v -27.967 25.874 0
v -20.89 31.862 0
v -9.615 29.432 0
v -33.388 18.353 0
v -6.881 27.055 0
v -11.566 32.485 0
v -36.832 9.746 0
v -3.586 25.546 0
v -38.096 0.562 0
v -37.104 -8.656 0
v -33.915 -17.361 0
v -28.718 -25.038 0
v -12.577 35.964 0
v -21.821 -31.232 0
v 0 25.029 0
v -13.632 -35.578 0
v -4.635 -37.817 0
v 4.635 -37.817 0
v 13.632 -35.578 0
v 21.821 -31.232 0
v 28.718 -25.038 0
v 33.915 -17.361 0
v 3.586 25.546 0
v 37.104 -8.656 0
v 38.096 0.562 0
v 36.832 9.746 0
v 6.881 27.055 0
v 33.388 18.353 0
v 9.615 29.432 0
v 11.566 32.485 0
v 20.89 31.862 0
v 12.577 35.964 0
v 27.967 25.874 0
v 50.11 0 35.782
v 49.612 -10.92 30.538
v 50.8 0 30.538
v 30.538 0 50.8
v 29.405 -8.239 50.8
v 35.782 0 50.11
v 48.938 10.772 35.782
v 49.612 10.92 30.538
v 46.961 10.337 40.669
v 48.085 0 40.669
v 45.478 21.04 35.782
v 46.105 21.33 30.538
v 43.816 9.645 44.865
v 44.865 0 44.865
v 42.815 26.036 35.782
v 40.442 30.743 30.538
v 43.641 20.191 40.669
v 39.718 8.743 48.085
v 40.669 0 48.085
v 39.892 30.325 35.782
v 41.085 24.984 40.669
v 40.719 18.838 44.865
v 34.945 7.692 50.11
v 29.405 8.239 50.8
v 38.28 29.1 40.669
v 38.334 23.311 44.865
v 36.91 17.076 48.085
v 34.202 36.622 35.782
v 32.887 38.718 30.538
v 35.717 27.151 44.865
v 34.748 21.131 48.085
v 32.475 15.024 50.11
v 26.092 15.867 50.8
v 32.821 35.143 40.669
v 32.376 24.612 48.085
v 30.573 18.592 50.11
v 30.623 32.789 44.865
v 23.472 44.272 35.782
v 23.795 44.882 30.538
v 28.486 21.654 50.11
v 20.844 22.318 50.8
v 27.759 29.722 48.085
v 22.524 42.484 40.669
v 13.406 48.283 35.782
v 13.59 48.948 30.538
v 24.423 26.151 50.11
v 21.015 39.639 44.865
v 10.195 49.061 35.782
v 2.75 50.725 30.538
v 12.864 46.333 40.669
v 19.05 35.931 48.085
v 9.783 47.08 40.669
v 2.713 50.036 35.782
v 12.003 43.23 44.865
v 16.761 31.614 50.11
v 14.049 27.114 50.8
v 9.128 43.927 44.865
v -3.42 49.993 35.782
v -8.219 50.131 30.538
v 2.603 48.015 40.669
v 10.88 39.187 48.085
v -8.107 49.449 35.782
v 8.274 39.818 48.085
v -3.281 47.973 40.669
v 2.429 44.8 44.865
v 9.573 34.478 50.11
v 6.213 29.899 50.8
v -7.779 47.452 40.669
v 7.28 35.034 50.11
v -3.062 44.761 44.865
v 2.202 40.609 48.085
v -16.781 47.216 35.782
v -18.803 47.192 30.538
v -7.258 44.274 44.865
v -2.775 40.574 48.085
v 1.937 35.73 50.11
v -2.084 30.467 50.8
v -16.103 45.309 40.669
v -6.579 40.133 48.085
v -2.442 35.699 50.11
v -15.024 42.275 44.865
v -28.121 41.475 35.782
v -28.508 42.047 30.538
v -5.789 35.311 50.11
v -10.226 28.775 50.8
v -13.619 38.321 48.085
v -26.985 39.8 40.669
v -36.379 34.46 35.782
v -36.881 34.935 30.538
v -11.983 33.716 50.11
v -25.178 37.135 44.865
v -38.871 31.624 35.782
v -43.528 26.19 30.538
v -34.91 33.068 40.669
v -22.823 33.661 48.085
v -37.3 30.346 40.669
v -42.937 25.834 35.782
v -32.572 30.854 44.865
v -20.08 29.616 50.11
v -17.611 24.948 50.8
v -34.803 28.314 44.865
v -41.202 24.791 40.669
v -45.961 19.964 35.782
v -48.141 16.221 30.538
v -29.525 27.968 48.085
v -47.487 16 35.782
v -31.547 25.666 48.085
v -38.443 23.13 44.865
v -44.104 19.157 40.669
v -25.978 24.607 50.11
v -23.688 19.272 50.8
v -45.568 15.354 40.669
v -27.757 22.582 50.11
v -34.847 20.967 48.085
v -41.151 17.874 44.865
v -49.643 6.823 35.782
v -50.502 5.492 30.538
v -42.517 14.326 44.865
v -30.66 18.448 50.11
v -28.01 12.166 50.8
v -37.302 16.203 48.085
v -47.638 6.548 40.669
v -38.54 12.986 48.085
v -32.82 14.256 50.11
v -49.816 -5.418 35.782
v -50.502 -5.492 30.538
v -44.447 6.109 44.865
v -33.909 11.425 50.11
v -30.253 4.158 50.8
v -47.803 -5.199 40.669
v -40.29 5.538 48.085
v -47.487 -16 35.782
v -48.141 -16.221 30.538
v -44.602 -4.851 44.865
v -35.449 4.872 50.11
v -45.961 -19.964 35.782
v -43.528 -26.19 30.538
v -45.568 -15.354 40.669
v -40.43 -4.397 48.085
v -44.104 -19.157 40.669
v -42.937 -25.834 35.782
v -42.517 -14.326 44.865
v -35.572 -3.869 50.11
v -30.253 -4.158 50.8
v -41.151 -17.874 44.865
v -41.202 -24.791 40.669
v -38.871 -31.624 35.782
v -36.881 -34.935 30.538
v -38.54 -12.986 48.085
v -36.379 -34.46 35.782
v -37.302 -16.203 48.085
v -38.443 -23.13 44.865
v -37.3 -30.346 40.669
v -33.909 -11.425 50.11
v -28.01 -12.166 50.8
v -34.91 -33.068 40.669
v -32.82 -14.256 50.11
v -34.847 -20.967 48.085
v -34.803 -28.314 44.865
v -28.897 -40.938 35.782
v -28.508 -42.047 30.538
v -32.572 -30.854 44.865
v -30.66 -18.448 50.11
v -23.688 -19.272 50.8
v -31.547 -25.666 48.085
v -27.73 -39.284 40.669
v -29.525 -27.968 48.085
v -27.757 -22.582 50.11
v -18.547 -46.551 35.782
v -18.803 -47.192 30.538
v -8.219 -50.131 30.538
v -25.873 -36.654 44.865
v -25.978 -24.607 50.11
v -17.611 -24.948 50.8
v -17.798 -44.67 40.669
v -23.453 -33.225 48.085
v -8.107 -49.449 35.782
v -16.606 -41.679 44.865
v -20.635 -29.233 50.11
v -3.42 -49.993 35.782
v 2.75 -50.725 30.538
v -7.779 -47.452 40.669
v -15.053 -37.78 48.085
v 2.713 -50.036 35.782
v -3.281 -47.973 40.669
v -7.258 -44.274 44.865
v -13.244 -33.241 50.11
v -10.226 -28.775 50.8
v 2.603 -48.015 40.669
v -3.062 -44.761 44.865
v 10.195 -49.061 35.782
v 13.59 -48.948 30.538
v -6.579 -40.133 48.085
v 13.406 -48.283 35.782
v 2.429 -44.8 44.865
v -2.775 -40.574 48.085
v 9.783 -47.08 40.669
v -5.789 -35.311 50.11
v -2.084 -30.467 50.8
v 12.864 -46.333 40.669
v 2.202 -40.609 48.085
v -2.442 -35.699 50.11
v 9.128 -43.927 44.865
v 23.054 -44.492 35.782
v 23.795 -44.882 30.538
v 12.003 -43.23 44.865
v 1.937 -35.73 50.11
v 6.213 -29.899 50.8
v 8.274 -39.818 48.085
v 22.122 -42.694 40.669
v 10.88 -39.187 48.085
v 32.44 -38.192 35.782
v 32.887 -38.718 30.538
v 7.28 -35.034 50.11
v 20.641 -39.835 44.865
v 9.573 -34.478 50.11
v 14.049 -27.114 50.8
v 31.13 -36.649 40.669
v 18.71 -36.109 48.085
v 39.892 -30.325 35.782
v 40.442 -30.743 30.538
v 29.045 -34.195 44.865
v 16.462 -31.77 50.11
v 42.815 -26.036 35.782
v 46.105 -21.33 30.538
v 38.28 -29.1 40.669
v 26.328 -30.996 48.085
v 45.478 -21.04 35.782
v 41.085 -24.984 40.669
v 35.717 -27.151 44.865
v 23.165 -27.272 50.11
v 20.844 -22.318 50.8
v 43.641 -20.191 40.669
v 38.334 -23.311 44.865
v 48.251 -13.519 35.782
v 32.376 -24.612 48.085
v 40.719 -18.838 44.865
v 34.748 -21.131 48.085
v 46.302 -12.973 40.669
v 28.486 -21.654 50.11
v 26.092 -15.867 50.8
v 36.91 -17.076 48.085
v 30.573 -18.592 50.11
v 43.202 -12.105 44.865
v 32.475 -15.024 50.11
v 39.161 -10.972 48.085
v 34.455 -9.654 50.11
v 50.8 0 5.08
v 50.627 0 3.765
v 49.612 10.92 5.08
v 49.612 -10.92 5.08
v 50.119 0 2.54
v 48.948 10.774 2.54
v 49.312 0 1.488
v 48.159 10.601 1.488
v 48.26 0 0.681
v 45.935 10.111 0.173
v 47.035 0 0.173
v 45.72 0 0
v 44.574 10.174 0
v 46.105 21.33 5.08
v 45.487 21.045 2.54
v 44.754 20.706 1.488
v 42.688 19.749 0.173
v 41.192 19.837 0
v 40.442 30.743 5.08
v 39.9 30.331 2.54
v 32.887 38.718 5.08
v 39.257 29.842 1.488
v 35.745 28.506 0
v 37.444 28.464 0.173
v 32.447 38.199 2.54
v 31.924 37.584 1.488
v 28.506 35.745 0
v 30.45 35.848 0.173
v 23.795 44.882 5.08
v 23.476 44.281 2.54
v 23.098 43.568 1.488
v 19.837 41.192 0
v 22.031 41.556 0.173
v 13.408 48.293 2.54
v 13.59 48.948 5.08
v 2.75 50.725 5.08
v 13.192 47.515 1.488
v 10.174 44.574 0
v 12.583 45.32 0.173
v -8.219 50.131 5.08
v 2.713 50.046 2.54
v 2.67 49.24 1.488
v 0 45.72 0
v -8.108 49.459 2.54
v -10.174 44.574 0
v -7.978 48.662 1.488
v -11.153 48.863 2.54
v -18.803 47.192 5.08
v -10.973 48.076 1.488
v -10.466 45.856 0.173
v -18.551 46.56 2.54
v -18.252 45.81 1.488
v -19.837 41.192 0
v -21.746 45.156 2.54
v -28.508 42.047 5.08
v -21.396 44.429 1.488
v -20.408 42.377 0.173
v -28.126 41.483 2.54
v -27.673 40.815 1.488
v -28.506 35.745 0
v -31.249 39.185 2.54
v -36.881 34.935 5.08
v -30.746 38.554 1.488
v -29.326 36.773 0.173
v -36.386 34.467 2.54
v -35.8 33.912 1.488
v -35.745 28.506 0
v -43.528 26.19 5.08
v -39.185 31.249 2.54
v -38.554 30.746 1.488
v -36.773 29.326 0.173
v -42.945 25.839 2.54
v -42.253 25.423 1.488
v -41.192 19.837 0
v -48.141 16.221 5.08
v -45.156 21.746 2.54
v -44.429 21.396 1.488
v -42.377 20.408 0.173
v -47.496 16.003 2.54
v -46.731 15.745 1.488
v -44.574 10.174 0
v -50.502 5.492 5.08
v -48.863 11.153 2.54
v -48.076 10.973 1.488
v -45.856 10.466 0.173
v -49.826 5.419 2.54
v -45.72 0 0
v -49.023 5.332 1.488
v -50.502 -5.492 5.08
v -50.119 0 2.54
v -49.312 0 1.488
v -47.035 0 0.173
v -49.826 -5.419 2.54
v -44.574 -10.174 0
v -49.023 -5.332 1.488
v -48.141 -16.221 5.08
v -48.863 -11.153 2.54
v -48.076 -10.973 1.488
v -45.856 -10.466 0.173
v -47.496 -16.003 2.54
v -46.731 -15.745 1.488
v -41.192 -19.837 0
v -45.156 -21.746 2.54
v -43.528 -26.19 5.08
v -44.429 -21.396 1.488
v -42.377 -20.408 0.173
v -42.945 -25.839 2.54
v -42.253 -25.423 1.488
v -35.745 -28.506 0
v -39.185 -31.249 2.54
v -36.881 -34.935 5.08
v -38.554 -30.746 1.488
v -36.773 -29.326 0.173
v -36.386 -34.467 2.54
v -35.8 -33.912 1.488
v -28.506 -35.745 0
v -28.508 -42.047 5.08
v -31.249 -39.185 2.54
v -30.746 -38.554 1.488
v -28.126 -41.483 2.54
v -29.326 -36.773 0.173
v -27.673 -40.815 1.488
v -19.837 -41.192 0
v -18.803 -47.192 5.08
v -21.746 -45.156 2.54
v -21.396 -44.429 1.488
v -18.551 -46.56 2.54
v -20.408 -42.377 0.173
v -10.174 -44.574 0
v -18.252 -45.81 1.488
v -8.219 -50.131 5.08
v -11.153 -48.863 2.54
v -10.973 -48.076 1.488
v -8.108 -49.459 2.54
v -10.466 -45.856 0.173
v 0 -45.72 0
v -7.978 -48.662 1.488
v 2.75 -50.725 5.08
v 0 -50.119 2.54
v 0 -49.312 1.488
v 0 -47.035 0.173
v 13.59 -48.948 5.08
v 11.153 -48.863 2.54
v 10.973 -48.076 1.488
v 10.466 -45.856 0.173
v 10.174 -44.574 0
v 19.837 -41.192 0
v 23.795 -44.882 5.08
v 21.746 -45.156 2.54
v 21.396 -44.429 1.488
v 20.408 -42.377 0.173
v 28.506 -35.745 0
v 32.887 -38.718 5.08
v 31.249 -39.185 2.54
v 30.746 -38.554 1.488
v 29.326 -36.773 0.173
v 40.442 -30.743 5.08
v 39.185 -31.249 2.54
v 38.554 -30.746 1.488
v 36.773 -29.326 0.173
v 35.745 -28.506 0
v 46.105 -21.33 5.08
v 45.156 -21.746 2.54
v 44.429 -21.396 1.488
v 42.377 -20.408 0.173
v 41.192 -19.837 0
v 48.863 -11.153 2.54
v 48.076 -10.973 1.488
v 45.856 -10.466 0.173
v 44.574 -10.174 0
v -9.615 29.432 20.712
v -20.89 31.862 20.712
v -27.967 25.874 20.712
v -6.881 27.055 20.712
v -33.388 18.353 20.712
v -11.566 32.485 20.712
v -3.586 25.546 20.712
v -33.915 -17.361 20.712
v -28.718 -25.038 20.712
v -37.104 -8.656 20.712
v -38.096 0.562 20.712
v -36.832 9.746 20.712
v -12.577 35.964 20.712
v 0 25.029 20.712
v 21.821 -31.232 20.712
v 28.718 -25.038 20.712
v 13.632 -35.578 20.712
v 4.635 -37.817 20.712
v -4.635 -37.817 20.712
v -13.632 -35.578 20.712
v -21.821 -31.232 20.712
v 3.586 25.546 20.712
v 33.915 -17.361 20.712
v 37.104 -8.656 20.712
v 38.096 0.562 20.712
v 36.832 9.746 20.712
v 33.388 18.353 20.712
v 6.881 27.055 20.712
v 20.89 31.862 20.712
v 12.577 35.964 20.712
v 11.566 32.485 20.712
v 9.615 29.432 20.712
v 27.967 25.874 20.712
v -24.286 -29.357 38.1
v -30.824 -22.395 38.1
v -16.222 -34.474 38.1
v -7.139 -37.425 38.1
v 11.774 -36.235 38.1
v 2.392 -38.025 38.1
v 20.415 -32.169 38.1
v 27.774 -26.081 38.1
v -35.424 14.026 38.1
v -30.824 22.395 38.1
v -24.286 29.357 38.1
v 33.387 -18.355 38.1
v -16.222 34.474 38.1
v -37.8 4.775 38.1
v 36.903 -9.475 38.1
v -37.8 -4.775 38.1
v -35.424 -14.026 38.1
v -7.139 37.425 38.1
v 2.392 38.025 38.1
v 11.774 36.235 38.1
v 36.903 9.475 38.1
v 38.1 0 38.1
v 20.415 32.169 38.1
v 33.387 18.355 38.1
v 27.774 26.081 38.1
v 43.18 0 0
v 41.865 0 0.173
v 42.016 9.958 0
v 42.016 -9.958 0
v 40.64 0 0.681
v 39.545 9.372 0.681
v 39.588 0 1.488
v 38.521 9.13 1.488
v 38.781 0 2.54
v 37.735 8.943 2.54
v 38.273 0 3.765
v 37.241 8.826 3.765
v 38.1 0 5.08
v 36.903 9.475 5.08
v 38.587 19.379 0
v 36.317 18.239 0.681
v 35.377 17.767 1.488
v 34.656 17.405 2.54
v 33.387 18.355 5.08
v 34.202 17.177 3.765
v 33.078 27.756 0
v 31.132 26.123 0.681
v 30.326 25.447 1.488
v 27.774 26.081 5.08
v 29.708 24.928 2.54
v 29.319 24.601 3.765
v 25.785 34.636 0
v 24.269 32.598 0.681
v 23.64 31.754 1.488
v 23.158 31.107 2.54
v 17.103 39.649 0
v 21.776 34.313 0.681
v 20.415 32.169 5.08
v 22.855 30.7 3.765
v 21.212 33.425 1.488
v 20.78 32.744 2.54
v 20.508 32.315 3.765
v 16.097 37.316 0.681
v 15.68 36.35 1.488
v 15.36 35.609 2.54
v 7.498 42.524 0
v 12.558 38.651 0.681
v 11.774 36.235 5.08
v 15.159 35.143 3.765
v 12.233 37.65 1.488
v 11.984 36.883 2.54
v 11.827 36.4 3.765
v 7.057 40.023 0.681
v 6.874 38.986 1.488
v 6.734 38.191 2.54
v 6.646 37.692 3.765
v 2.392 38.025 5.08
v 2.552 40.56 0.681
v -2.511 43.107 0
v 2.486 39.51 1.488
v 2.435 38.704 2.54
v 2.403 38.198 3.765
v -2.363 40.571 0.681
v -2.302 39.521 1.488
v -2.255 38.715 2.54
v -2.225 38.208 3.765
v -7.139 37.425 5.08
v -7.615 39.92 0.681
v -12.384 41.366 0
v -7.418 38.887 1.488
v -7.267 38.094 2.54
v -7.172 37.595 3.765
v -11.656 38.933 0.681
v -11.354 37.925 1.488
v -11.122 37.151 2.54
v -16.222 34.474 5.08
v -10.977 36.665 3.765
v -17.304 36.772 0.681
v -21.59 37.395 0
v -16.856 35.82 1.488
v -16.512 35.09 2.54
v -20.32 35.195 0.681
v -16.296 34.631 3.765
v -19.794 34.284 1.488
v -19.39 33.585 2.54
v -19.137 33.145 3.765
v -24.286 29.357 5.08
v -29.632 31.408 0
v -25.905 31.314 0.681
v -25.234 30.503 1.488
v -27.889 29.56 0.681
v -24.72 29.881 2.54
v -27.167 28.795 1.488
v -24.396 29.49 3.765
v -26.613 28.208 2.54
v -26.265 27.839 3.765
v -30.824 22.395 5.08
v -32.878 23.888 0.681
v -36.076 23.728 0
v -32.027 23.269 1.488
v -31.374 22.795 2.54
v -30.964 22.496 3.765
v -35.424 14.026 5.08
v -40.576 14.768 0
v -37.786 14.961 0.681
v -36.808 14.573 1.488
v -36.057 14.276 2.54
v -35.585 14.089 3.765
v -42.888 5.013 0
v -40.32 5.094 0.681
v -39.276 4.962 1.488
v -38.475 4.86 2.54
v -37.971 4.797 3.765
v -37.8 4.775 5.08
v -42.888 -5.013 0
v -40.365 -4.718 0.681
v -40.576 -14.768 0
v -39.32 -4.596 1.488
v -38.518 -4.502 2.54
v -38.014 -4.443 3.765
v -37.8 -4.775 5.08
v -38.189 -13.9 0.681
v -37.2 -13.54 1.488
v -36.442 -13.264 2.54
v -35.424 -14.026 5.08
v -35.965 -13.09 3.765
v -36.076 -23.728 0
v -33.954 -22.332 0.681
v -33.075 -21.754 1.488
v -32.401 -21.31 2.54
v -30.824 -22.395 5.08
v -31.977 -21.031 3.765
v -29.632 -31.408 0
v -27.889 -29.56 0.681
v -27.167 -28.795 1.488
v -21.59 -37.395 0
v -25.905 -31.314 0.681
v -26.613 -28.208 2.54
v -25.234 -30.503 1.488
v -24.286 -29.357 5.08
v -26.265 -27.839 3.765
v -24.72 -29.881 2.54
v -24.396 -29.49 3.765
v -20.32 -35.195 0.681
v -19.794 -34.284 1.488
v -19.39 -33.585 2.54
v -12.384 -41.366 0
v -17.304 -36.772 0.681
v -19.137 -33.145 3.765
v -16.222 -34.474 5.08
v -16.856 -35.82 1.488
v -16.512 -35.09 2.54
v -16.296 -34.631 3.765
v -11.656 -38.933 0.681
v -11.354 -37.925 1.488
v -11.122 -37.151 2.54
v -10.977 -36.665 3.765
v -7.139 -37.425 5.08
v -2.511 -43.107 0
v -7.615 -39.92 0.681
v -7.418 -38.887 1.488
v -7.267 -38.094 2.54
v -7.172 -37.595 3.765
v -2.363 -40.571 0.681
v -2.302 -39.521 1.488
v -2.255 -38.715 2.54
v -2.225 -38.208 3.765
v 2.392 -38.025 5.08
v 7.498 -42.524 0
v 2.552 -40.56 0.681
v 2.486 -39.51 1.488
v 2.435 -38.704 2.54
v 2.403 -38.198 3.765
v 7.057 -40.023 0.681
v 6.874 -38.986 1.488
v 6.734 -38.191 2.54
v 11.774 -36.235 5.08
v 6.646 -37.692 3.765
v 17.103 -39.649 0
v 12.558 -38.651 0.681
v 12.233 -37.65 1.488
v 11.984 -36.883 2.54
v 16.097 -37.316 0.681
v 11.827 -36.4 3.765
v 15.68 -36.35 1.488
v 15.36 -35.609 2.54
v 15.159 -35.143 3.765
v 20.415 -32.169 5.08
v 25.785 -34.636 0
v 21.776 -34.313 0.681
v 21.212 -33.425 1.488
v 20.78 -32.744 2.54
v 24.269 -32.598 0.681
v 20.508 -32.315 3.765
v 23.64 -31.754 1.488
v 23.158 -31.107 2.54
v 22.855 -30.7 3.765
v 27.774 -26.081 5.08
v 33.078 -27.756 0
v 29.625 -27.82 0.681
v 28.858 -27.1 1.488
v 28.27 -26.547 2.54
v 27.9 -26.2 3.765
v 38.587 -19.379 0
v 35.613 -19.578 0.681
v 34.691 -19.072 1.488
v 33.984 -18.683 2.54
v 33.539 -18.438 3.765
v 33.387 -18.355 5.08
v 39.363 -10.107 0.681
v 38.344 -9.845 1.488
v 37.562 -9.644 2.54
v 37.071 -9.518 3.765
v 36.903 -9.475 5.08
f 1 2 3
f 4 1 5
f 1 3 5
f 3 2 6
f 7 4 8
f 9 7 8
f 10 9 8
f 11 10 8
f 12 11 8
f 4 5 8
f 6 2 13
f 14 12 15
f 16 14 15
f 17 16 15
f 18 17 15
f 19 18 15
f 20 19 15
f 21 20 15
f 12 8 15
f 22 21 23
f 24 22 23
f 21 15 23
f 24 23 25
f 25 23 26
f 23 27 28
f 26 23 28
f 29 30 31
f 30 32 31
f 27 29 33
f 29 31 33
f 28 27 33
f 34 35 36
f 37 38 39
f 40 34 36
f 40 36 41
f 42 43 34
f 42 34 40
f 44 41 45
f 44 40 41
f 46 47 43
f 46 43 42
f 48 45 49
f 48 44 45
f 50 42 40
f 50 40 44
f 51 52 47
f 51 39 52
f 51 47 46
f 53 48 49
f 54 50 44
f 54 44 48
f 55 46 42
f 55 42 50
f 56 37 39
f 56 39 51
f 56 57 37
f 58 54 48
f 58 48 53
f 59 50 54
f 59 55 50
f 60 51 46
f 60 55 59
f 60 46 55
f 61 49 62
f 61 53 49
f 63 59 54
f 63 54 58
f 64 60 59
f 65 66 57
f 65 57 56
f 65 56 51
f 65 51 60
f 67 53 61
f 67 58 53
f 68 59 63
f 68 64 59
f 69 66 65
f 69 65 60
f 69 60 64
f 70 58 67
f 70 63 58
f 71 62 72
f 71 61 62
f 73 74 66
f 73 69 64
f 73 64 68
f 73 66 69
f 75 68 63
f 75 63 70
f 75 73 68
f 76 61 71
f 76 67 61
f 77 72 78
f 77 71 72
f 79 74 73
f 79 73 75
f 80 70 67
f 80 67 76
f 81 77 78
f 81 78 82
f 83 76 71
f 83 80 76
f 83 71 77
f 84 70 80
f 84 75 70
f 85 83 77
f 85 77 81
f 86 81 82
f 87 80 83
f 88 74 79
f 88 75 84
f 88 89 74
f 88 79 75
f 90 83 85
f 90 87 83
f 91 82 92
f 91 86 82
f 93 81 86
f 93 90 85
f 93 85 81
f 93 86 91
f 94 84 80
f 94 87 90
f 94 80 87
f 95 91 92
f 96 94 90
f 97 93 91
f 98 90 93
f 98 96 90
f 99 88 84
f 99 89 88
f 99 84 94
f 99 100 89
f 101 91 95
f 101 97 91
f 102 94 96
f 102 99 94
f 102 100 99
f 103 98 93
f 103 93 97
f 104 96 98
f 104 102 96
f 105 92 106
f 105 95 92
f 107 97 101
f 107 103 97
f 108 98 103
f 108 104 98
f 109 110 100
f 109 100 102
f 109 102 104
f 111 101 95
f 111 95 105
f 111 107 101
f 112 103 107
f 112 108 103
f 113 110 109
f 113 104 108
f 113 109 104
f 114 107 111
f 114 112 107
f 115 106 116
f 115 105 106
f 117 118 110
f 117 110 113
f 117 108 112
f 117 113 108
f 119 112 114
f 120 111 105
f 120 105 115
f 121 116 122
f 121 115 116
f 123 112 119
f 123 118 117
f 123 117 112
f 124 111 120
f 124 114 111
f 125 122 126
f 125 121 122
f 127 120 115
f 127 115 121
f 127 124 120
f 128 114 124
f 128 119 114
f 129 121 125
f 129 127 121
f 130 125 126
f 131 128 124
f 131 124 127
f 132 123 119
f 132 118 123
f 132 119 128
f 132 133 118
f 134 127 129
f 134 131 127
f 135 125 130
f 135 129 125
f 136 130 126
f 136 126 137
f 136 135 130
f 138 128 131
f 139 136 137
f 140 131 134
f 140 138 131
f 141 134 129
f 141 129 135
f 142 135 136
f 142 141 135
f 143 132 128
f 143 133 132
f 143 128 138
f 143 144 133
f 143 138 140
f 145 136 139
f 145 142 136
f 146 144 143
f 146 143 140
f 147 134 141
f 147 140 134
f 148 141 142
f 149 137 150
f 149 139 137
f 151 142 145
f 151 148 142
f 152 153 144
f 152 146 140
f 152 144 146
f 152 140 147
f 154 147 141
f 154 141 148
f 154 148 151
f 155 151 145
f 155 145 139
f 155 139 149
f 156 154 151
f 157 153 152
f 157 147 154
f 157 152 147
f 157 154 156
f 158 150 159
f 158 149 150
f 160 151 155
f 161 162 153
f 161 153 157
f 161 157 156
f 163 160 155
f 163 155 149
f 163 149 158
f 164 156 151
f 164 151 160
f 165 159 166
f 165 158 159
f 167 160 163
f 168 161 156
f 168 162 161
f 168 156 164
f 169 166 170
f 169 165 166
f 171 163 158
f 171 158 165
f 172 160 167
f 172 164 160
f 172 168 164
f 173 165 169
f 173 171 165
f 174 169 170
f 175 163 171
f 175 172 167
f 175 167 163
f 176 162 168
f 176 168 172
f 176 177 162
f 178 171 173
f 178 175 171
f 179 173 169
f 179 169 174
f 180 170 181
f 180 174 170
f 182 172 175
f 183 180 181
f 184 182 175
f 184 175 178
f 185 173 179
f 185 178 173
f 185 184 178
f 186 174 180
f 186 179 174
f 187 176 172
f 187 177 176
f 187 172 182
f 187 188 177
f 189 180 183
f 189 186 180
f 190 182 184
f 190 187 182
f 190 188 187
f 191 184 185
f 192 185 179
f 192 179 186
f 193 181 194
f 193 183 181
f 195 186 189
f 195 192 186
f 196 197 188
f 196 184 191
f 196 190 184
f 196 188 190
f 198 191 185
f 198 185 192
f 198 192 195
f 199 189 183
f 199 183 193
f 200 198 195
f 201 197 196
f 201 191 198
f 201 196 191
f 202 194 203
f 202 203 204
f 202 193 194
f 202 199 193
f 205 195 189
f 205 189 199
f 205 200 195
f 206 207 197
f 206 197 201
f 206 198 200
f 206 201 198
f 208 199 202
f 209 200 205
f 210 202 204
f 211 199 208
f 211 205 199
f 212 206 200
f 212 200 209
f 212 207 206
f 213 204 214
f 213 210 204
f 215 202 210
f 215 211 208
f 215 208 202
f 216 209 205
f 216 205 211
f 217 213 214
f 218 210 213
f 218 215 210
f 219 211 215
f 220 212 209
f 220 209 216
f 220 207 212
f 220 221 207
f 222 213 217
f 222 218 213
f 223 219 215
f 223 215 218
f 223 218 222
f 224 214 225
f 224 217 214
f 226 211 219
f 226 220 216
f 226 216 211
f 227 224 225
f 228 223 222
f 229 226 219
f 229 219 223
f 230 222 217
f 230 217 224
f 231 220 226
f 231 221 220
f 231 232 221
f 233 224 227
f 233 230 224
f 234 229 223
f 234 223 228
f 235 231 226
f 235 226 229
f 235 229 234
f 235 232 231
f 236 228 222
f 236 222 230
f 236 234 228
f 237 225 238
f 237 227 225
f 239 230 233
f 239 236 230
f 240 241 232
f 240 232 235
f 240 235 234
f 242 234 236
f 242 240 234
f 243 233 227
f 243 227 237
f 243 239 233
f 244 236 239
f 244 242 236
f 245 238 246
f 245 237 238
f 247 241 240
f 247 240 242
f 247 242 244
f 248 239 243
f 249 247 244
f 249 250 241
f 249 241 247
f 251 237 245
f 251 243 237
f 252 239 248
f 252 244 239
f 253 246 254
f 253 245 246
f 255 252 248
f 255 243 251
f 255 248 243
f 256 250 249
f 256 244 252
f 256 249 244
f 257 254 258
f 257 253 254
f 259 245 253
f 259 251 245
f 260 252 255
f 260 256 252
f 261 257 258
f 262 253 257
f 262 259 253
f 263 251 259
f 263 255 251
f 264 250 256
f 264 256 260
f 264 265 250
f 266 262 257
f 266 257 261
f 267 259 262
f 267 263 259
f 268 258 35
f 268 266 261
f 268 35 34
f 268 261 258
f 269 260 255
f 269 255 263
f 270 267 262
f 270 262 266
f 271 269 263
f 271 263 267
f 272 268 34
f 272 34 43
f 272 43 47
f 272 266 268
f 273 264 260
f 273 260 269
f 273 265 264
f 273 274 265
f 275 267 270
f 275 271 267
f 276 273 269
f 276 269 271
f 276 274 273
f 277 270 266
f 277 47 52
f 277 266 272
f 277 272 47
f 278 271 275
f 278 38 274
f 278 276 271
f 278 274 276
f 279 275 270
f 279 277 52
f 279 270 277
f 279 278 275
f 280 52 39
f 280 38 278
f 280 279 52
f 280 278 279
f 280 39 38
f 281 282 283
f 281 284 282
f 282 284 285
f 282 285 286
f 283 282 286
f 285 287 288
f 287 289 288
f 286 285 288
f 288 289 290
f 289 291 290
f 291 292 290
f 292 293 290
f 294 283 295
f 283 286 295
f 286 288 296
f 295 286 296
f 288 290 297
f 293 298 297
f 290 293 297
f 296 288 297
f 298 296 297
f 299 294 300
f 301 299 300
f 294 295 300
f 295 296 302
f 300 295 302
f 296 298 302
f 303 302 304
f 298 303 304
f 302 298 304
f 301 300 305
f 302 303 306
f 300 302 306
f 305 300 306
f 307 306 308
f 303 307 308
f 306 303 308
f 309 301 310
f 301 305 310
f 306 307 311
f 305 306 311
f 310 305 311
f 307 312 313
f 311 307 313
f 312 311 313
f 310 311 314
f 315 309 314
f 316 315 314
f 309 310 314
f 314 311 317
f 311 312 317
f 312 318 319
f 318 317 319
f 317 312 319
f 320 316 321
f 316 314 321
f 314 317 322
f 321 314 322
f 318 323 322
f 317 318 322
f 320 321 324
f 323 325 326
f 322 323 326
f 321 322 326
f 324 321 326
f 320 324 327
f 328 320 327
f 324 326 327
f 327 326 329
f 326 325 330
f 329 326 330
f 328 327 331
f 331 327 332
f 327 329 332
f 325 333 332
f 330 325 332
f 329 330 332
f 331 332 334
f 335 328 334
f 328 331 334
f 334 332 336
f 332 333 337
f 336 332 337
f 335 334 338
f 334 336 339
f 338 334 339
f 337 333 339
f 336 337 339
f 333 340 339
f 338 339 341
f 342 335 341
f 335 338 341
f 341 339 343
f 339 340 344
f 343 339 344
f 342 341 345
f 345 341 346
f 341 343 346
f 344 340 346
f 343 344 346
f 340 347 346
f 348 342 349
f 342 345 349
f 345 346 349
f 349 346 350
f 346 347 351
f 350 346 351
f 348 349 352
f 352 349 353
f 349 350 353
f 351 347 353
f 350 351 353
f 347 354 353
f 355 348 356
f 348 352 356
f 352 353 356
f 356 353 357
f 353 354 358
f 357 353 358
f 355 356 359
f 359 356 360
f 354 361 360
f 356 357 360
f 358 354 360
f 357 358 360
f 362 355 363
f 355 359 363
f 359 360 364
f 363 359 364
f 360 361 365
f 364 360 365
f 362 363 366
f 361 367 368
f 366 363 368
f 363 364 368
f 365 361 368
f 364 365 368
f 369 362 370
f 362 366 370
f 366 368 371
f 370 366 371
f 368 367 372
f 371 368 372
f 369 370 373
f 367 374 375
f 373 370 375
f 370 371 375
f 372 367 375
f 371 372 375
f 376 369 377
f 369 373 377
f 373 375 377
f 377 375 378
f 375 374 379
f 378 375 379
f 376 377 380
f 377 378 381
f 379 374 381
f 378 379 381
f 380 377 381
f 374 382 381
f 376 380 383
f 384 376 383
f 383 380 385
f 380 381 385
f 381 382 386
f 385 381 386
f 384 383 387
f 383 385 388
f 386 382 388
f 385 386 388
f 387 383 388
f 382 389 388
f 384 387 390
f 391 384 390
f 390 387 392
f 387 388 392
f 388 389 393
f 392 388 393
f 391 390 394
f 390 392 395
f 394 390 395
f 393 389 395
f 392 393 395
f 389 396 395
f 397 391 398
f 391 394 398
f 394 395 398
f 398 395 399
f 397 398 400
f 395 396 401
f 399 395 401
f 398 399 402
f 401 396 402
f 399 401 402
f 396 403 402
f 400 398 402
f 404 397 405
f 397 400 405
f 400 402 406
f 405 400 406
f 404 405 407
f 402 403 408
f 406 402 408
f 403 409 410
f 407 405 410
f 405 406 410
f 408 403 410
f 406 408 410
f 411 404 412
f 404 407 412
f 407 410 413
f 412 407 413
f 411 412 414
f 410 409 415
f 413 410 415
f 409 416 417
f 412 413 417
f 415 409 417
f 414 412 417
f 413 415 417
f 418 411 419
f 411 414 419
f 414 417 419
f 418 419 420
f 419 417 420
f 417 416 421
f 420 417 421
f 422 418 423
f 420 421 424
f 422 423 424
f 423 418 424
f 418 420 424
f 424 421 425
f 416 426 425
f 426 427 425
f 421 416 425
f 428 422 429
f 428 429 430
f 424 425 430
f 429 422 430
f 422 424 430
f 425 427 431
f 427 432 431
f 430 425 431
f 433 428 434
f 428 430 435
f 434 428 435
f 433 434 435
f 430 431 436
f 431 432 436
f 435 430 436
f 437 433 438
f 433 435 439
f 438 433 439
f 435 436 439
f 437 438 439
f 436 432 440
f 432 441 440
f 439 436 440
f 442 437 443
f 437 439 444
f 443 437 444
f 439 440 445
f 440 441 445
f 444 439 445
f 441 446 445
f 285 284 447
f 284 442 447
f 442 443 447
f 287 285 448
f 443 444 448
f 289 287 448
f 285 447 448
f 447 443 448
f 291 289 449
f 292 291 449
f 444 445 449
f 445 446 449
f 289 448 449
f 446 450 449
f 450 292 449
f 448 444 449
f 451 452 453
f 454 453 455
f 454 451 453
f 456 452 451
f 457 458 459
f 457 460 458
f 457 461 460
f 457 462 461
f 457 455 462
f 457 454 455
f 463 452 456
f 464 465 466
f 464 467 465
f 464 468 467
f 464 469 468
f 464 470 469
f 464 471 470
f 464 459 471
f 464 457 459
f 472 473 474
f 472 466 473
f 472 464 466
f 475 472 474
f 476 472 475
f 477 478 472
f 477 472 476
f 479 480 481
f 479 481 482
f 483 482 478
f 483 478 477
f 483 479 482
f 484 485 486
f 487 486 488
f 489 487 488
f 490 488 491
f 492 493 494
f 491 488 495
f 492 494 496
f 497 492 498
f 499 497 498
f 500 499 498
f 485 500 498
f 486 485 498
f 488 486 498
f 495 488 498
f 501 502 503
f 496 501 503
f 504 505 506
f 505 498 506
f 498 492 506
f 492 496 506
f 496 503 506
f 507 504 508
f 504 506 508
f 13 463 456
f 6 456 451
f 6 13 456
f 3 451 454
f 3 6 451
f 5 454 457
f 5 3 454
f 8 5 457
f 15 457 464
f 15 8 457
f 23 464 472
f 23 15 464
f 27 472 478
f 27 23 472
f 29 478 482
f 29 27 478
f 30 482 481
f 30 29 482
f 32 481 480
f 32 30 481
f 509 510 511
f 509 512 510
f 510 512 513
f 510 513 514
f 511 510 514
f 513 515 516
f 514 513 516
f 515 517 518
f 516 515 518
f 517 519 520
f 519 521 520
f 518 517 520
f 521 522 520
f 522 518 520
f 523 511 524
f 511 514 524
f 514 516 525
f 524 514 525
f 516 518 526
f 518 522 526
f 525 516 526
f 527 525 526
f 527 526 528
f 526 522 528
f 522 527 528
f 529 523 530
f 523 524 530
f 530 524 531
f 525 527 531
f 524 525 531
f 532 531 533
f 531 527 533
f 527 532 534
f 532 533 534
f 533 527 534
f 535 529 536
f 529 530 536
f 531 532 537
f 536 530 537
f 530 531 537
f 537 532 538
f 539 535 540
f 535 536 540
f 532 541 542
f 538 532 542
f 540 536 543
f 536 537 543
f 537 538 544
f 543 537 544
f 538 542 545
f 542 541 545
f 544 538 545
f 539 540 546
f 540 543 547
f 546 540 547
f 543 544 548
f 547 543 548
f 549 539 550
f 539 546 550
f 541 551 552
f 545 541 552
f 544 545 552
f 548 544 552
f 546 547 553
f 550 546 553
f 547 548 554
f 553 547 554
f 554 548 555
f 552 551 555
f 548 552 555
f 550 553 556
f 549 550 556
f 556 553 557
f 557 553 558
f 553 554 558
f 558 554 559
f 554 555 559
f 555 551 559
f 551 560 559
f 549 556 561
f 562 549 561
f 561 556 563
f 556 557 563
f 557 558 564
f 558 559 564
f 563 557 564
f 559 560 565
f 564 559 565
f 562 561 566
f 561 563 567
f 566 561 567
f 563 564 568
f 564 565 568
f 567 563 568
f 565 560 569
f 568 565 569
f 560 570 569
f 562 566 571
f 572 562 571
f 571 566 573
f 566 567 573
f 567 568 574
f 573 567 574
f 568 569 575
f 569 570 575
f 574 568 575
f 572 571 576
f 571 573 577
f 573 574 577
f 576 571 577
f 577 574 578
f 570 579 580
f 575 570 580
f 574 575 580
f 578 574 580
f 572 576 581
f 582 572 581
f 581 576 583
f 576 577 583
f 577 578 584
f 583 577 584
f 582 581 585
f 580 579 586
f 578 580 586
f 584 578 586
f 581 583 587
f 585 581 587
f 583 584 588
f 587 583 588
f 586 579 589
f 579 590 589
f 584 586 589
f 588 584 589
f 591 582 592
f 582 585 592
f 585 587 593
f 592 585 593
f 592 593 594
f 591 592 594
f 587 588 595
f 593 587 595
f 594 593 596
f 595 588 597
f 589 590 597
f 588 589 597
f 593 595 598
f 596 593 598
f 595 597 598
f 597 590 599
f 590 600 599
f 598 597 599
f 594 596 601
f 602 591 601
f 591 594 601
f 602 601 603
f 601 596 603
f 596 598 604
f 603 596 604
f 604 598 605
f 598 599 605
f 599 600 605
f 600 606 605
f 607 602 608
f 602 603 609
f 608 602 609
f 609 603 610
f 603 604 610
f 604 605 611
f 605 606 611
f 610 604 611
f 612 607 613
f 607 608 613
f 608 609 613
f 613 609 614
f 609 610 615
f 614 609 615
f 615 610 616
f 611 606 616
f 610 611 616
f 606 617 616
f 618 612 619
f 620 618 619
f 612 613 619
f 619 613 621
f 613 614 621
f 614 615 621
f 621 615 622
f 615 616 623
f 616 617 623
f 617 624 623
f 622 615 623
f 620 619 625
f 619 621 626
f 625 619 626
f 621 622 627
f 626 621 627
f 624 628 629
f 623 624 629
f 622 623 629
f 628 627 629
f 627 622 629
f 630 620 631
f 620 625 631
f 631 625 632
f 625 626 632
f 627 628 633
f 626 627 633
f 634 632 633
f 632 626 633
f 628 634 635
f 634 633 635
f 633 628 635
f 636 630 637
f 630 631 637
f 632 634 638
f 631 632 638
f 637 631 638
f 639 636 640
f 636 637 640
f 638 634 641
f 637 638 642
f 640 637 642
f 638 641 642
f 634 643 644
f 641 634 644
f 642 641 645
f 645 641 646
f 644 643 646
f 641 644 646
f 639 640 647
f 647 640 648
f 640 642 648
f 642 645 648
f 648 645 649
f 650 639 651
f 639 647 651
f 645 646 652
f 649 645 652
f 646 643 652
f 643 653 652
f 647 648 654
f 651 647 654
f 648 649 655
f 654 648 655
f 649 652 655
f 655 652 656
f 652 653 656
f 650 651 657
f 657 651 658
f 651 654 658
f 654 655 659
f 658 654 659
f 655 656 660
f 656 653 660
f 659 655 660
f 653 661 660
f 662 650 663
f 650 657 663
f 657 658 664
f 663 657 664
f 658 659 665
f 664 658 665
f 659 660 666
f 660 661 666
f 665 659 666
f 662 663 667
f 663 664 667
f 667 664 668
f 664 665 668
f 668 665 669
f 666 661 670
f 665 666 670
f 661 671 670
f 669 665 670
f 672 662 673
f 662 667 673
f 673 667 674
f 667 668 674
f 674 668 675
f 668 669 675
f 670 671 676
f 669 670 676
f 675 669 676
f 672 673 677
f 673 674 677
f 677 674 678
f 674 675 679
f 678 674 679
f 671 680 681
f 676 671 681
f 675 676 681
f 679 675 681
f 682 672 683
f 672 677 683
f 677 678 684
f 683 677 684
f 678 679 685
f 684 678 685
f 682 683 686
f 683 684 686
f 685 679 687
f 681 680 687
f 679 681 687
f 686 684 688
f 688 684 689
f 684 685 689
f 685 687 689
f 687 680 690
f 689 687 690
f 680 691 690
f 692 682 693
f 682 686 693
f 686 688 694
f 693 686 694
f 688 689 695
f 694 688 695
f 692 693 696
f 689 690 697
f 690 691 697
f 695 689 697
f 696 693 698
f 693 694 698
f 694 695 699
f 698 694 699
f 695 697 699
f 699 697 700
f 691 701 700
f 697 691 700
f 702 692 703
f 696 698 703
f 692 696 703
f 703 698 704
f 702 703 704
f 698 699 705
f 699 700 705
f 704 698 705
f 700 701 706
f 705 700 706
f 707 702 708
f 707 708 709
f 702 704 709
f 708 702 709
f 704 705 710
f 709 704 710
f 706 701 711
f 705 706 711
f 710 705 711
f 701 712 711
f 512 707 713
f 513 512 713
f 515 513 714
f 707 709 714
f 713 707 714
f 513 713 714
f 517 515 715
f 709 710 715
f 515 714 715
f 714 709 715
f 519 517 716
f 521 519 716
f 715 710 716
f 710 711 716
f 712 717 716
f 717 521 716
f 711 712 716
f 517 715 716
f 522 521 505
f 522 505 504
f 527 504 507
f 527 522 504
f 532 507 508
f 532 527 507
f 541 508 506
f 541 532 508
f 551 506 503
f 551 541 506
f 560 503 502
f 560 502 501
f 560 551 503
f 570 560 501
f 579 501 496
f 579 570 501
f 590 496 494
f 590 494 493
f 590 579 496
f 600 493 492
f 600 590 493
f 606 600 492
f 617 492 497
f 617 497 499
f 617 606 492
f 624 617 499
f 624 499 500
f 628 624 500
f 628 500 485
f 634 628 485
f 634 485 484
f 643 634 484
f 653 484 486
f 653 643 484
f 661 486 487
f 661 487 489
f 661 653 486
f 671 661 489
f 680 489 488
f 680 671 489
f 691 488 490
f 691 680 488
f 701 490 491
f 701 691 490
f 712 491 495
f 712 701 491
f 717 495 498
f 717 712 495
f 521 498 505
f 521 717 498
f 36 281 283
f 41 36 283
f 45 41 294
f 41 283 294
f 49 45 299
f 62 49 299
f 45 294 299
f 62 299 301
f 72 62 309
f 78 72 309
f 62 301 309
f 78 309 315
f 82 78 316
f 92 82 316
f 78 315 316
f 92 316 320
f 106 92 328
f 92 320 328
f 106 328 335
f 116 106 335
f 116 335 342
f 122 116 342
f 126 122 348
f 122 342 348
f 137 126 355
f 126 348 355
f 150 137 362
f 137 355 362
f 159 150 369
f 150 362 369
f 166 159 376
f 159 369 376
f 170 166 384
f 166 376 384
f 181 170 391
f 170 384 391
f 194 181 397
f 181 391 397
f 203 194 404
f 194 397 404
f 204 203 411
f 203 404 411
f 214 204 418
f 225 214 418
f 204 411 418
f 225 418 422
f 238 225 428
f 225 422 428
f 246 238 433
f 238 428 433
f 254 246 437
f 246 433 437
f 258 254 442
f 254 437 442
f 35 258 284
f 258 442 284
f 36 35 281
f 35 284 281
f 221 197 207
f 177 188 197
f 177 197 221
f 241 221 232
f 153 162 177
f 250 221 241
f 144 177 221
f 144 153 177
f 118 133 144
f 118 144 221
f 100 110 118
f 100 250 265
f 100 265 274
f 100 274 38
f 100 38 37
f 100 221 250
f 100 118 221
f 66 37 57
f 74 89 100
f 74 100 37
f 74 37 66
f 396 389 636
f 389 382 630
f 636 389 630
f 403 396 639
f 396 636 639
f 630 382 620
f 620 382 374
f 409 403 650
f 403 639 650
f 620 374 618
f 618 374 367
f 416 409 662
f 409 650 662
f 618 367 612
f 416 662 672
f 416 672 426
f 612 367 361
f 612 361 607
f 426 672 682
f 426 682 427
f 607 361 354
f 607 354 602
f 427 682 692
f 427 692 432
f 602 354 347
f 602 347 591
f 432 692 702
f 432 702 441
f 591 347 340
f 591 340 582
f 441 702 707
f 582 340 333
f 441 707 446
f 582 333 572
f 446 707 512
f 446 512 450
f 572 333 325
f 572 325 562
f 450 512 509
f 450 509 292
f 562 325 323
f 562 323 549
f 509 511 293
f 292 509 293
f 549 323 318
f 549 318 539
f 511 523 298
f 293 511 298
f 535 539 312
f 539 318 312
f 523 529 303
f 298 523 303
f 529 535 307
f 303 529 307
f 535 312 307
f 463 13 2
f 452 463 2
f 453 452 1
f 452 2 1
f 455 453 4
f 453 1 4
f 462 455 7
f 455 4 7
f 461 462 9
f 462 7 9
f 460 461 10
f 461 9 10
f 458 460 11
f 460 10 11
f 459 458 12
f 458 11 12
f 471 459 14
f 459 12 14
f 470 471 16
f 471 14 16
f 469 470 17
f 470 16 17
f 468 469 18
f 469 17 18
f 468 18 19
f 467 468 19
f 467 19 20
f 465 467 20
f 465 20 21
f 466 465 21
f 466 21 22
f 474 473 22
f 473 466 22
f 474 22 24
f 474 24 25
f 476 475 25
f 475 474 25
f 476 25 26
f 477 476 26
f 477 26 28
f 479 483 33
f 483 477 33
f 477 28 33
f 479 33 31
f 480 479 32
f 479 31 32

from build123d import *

# Parameters (mm, degrees)
F0_R     = 50.8
F0_R_2   = 38.1
F1_DEPTH = 50.8
F2_DEPTH = 38.1
F3_R     = 5.08
F4_R     = 20.2622288655
F5_DEPTH = 20.71222
F7_DEPTH = 34.26479


with BuildPart() as f1:
    # F0 (on Top) → F1 (new body)
    with BuildSketch(Plane.XY):
        Circle(F0_R)
        Circle(F0_R_2, mode=Mode.SUBTRACT)
        Circle(F0_R_2)
    extrude(amount=F1_DEPTH)

    # F0 (on Top) → F2 (cut)
    with BuildSketch(Plane.XY):
        Circle(F0_R_2)
    extrude(amount=F2_DEPTH, mode=Mode.SUBTRACT)

    # F3
    f3_edges = [f1.edges().sort_by_distance(p)[0] for p in [
        (-50.8, 0, 0),
        (-38.1, 0, 0),
    ]]
    fillet(f3_edges, radius=F3_R)

    # F4
    f4_edges = [f1.edges().sort_by_distance(p)[0] for p in [
        (-50.8, 0, 50.8),
    ]]
    fillet(f4_edges, radius=F4_R)


with BuildPart() as f5:
    # F0 (on Top) → F5 (new body)
    with BuildSketch(Plane.XY):
        Circle(F0_R_2)
    extrude(amount=F5_DEPTH)

    # F6 (on face) → F7 (cut)
    with BuildSketch(Plane.XY):
        with BuildLine():
            ThreePointArc((12.5767484106, 35.9643629085), (0, 38.1), (-12.5767484106, 35.9643629085))
            ThreePointArc((-12.5767484106, 35.9643629085), (0, 25.0294123173), (12.5767484106, 35.9643629085))
        make_face()
    extrude(amount=F7_DEPTH, mode=Mode.SUBTRACT)


solid = Compound([f1.part, f5.part])
